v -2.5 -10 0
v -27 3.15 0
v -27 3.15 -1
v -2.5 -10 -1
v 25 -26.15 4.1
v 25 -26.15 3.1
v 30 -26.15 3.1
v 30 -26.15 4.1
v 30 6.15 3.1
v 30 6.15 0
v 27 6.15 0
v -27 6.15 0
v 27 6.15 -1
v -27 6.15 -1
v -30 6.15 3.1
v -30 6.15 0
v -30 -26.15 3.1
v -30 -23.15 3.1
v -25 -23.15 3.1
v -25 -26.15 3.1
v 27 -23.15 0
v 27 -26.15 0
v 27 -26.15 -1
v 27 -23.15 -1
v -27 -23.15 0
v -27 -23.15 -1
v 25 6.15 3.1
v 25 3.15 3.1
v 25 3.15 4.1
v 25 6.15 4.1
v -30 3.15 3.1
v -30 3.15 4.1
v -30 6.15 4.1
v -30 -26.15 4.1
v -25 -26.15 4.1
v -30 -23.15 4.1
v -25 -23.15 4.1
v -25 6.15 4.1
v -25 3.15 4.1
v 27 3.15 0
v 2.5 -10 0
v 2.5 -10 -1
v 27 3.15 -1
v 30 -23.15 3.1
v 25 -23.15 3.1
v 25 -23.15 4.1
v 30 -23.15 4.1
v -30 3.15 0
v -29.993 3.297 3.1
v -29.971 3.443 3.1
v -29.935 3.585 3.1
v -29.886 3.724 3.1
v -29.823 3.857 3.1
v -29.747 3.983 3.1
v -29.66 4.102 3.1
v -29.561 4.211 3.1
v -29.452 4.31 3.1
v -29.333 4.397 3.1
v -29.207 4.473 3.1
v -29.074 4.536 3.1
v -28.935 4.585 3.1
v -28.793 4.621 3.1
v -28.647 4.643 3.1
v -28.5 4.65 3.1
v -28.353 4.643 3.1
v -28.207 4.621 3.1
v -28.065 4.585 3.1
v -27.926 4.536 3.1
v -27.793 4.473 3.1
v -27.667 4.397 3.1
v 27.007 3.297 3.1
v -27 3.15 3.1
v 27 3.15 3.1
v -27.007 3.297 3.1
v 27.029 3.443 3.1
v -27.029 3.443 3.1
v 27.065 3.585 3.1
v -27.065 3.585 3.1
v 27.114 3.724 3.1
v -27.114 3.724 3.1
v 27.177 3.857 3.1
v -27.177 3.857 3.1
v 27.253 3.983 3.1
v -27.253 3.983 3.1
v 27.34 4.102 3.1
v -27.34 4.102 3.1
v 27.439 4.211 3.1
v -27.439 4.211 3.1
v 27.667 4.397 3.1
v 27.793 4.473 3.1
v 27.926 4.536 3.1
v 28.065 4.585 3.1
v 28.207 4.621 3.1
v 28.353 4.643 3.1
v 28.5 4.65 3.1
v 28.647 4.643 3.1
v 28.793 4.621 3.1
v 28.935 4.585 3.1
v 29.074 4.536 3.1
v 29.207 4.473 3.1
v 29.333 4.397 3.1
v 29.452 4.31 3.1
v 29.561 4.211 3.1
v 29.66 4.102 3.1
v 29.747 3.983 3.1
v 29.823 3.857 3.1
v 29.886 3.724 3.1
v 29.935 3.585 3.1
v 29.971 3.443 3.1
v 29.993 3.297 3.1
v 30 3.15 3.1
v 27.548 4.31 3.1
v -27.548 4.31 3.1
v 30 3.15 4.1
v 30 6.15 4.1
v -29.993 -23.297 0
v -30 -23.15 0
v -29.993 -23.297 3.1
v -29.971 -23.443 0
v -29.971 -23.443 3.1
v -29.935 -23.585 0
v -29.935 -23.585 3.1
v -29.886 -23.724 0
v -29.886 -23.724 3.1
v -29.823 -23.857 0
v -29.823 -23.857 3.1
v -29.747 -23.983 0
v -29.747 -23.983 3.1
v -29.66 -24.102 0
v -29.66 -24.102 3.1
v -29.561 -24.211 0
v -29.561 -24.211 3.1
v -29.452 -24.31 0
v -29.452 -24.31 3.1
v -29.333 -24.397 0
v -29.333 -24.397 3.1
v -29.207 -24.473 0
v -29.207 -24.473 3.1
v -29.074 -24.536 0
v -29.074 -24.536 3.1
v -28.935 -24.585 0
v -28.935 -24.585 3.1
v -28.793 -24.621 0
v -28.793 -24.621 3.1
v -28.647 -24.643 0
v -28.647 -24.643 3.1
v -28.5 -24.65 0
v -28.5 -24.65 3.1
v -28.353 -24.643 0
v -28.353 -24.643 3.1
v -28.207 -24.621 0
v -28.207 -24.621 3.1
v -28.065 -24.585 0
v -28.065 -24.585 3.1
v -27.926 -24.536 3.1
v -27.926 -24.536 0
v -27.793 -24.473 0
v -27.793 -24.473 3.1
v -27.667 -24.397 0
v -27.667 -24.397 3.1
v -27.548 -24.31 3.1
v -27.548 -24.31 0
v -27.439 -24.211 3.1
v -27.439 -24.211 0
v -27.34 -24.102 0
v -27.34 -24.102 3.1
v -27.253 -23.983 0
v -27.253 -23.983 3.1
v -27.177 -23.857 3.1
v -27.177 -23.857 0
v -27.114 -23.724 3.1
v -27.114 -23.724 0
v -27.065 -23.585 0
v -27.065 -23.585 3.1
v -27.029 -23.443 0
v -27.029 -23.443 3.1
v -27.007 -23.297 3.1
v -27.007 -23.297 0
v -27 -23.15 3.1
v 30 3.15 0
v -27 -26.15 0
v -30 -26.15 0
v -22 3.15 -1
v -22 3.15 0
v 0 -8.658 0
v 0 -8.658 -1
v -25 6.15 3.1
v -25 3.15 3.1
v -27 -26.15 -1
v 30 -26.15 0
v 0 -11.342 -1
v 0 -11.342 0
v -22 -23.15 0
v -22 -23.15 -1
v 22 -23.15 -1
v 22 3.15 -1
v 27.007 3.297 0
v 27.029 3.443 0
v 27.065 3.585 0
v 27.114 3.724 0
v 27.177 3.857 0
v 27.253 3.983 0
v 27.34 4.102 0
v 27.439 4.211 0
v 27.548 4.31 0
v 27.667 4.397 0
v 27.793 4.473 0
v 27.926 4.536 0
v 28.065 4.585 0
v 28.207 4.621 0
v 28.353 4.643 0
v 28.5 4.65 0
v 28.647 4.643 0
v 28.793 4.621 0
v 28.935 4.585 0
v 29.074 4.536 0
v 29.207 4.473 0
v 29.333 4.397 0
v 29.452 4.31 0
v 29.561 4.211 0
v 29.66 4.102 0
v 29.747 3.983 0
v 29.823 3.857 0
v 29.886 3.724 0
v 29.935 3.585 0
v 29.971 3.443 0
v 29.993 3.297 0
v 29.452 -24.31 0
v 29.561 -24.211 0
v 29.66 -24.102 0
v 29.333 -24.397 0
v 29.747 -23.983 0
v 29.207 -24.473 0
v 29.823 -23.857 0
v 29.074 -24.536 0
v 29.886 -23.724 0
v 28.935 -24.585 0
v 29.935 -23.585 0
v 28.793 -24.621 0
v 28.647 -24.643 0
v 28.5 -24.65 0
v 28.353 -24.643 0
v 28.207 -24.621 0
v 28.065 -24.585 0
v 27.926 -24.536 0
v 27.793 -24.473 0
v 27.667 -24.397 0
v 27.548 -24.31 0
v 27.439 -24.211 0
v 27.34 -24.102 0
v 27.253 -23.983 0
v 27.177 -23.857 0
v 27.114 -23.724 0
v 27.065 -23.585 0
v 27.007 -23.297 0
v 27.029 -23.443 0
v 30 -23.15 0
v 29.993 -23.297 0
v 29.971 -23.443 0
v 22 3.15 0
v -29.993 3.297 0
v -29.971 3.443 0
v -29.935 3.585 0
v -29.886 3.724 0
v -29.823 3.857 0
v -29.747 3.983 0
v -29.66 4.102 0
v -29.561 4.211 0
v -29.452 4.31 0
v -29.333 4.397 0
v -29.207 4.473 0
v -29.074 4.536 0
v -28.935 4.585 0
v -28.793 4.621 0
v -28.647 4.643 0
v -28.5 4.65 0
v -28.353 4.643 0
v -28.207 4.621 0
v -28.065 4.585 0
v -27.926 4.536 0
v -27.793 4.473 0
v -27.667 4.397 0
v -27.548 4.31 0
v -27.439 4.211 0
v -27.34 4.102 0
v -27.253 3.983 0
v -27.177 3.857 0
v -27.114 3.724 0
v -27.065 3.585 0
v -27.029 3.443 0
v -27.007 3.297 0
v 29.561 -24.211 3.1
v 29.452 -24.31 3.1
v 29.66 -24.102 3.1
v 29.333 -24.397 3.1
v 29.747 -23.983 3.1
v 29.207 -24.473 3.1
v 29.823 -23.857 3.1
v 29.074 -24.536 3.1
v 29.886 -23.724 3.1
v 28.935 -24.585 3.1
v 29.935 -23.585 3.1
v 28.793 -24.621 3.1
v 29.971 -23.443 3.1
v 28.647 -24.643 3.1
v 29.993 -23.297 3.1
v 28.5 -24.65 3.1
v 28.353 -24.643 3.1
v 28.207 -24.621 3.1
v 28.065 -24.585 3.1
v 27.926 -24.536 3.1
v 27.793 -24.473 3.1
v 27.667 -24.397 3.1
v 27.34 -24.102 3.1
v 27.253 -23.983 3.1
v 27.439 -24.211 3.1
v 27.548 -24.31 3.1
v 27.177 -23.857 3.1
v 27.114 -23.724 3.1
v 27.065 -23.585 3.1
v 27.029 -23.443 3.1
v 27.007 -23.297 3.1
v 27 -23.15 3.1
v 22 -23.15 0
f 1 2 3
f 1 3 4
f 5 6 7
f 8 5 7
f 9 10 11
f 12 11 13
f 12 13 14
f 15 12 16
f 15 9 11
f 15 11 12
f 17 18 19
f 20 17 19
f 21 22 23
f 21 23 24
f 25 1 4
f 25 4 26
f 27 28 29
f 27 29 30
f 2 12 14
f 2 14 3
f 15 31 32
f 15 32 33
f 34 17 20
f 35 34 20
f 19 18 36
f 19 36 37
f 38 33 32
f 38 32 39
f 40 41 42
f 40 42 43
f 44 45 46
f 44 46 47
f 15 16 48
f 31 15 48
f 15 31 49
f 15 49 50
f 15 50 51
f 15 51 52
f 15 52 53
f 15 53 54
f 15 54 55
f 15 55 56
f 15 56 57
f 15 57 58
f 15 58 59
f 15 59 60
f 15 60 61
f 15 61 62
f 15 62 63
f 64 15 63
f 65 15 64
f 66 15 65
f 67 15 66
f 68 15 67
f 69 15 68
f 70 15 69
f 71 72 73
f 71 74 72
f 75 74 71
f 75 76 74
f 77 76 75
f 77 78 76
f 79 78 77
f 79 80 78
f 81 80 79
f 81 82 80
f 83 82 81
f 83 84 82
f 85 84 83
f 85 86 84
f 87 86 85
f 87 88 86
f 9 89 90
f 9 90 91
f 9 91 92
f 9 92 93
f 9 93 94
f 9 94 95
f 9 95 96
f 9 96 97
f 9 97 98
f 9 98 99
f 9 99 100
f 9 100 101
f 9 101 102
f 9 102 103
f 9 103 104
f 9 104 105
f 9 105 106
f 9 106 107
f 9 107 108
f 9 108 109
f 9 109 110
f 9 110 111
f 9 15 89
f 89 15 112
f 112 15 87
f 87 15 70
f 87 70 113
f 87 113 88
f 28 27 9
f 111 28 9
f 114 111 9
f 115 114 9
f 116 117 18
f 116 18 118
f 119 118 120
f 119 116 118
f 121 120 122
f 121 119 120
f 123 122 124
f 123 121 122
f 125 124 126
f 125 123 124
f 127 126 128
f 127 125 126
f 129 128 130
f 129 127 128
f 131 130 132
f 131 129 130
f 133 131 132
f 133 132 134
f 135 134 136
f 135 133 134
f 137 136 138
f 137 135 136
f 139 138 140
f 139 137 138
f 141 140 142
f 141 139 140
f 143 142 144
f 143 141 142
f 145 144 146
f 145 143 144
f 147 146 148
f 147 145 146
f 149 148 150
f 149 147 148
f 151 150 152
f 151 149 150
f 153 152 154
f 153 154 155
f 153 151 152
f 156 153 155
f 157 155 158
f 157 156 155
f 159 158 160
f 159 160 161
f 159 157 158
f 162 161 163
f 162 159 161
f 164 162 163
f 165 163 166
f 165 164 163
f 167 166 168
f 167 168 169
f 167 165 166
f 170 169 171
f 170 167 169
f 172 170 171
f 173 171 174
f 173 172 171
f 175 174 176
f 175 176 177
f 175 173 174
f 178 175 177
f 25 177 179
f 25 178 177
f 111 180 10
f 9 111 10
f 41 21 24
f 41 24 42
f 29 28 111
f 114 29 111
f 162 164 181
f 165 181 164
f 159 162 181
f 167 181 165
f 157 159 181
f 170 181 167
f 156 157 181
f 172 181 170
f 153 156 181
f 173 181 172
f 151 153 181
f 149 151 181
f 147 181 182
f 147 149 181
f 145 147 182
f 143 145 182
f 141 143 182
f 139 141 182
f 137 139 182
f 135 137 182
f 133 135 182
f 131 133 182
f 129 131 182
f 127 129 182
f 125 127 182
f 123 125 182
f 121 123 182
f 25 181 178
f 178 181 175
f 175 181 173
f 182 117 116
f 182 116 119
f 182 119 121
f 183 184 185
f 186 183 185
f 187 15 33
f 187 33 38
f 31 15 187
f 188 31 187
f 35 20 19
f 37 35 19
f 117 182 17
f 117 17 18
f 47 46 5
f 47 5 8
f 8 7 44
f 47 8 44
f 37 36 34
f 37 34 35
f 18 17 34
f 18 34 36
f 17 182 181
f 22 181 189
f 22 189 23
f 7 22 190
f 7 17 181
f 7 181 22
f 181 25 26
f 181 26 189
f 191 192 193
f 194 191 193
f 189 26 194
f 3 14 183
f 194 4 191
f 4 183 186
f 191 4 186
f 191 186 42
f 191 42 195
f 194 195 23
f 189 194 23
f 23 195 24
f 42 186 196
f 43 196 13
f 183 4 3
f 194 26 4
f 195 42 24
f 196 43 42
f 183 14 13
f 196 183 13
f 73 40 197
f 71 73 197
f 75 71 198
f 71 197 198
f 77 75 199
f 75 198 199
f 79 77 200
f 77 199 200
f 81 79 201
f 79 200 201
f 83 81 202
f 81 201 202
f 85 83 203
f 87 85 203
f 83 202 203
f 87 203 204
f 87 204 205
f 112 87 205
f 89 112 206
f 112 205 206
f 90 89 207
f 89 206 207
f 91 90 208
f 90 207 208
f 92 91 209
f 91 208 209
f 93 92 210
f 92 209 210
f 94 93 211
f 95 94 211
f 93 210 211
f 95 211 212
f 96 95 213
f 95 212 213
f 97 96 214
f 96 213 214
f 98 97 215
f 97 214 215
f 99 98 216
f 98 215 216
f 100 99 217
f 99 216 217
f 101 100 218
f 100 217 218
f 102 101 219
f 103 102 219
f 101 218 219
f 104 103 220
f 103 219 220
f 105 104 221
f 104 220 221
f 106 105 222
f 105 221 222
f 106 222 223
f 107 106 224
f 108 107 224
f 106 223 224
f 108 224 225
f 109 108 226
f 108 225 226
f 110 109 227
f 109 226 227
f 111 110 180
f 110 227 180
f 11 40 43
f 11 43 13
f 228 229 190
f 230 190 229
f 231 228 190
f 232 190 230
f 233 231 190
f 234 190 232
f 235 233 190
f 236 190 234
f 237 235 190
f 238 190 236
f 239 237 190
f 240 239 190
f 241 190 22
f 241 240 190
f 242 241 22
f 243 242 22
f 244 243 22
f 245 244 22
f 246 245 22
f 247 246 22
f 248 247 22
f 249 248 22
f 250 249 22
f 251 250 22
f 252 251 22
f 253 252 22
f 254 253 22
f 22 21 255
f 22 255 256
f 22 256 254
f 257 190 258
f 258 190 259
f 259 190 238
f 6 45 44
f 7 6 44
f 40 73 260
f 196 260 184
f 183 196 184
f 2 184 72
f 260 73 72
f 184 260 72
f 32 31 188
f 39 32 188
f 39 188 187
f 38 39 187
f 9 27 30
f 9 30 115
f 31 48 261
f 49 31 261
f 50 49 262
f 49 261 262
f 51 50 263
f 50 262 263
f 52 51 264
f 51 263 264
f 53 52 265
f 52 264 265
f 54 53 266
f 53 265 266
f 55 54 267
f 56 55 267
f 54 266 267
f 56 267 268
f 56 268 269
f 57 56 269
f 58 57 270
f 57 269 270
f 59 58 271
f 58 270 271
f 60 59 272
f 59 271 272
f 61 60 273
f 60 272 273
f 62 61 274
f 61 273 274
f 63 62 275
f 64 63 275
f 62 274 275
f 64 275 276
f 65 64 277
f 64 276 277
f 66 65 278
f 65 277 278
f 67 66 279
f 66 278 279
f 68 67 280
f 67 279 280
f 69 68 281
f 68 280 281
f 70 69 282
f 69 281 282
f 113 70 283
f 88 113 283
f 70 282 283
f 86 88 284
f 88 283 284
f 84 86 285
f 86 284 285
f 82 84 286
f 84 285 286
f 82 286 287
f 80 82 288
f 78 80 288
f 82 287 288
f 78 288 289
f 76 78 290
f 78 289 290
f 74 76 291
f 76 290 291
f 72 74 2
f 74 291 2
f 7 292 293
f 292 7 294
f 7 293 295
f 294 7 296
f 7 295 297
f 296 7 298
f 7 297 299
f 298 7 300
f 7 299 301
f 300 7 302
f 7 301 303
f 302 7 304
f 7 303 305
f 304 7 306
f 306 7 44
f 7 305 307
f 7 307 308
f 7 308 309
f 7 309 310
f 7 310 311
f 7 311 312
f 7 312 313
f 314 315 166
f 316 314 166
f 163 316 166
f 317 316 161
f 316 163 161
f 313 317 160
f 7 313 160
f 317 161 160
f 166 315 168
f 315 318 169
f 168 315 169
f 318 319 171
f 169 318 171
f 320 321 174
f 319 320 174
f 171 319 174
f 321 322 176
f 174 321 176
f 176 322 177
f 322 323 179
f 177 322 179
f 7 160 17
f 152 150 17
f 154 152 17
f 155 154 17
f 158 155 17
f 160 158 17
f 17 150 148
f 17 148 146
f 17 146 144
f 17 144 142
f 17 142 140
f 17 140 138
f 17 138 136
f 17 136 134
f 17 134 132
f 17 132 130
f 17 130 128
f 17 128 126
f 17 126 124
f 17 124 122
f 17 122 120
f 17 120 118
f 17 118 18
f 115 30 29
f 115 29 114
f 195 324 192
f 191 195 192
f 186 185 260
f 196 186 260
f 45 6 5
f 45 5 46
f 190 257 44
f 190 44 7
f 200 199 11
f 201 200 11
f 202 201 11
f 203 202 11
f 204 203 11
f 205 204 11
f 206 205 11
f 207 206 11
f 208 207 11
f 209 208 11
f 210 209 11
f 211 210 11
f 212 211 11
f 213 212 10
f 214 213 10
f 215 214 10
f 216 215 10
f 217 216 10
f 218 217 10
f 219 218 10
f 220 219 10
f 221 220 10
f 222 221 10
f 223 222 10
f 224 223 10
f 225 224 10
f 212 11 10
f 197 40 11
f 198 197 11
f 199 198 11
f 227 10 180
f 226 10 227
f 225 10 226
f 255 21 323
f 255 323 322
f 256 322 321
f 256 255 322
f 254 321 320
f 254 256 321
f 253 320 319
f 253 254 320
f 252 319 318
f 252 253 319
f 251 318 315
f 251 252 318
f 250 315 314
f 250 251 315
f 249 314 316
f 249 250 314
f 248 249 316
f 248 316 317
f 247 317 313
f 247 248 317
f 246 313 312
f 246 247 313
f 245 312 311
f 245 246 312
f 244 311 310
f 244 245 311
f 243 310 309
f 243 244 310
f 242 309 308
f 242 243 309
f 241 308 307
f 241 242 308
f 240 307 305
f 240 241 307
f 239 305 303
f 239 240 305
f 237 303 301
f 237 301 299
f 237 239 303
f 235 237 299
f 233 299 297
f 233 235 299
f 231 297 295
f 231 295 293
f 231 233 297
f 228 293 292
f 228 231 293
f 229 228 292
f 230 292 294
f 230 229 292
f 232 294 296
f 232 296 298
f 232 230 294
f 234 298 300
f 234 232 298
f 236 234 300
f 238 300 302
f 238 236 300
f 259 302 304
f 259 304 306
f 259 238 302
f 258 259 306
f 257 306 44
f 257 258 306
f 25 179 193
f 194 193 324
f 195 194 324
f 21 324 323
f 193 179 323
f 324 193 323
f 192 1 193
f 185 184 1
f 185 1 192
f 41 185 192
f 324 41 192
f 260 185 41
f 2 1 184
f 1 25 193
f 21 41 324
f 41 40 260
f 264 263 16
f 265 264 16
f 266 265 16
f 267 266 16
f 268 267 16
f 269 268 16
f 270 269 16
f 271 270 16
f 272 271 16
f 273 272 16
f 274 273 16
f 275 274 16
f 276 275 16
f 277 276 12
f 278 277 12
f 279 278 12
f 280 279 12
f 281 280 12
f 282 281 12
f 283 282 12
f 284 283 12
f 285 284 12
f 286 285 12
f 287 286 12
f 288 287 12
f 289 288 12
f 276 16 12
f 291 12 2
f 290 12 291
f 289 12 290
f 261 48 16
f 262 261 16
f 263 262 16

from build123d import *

# Parameters (mm, degrees)
BOSS_EXTRUDE1_DEPTH   = 3.1
BOSS_EXTRUDE1_2_DEPTH = 3.1
BOSS_EXTRUDE2_DEPTH   = 1
CUT_EXTRUDE1_DEPTH    = 2
SKETCH2_W             = 5
SKETCH2_H             = 3
BOSS_EXTRUDE3_DEPTH   = 1
BOSS_EXTRUDE3_2_DEPTH = 1
BOSS_EXTRUDE3_3_DEPTH = 1
BOSS_EXTRUDE3_4_DEPTH = 1


with BuildPart() as part:
    # female_slide → Boss-Extrude1 (new body)
    with BuildSketch(Plane.XY):
        with BuildLine():
            Line((-27, 3.15), (27, 3.15))
            ThreePointArc((27, 3.15), (28.5, 4.65), (30, 3.15))
            Line((30, 3.15), (30, 6.15))
            Line((30, 6.15), (-30, 6.15))
            Line((-30, 6.15), (-30, 3.15))
            ThreePointArc((-30, 3.15), (-28.5, 4.65), (-27, 3.15))
        make_face()
    extrude(amount=BOSS_EXTRUDE1_DEPTH)



with BuildPart() as body_2:
    # female_slide → Boss-Extrude1 2 (new body)
    with BuildSketch(Plane.XY):
        with BuildLine():
            Line((-27, -23.15), (27, -23.15))
            ThreePointArc((27, -23.15), (28.5, -24.65), (30, -23.15))
            Line((30, -23.15), (30, -26.15))
            Line((30, -26.15), (-30, -26.15))
            Line((-30, -26.15), (-30, -23.15))
            ThreePointArc((-30, -23.15), (-28.5, -24.65), (-27, -23.15))
        make_face()
    extrude(amount=BOSS_EXTRUDE1_2_DEPTH)


with BuildPart() as part_1:
    add(part.part)

    add(body_2.part)  # Boss-Extrude2 merges body 2
    # X_back → Boss-Extrude2 (add)
    with BuildSketch(Plane.XY):
        Polygon((22, 6.15), (-22, 6.15), (-27, 6.15), (-27, 3.15), (-2.5, -10), (-27, -23.15), (-27, -26.15), (-22, -26.15), (22, -26.15), (27, -26.15), (27, -23.15), (2.5, -10), (27, 3.15), (27, 6.15), align=None)
    extrude(amount=-BOSS_EXTRUDE2_DEPTH)

    # Sketch1 → Cut-Extrude1 (cut, through all)
    with BuildSketch(Plane.XY):
        Polygon((22, 3.15), (-22, 3.15), (0, -8.658163265), align=None)
        Polygon((0, -11.341836735), (-22, -23.15), (22, -23.15), align=None)
    extrude(amount=-CUT_EXTRUDE1_DEPTH, mode=Mode.SUBTRACT)


with BuildPart() as body_2_2:
    # Sketch2 → Boss-Extrude3 (new body)
    with BuildSketch(Plane.XY.offset(3.1)):
        with Locations((27.5, 4.65)):
            Rectangle(SKETCH2_W, SKETCH2_H)
    extrude(amount=BOSS_EXTRUDE3_DEPTH)


with BuildPart() as body_3:
    # Sketch2 → Boss-Extrude3 2 (new body)
    with BuildSketch(Plane.XY.offset(3.1)):
        with Locations((-27.5, 4.65)):
            Rectangle(SKETCH2_W, SKETCH2_H)
    extrude(amount=BOSS_EXTRUDE3_2_DEPTH)


with BuildPart() as body_4:
    # Sketch2 → Boss-Extrude3 3 (new body)
    with BuildSketch(Plane.XY.offset(3.1)):
        with Locations((27.5, -24.65)):
            Rectangle(SKETCH2_W, SKETCH2_H)
    extrude(amount=BOSS_EXTRUDE3_3_DEPTH)


with BuildPart() as body_5:
    # Sketch2 → Boss-Extrude3 4 (new body)
    with BuildSketch(Plane.XY.offset(3.1)):
        with Locations((-27.5, -24.65)):
            Rectangle(SKETCH2_W, SKETCH2_H)
    extrude(amount=BOSS_EXTRUDE3_4_DEPTH)


solid = Compound([part_1.part, body_2_2.part, body_3.part, body_4.part, body_5.part])
